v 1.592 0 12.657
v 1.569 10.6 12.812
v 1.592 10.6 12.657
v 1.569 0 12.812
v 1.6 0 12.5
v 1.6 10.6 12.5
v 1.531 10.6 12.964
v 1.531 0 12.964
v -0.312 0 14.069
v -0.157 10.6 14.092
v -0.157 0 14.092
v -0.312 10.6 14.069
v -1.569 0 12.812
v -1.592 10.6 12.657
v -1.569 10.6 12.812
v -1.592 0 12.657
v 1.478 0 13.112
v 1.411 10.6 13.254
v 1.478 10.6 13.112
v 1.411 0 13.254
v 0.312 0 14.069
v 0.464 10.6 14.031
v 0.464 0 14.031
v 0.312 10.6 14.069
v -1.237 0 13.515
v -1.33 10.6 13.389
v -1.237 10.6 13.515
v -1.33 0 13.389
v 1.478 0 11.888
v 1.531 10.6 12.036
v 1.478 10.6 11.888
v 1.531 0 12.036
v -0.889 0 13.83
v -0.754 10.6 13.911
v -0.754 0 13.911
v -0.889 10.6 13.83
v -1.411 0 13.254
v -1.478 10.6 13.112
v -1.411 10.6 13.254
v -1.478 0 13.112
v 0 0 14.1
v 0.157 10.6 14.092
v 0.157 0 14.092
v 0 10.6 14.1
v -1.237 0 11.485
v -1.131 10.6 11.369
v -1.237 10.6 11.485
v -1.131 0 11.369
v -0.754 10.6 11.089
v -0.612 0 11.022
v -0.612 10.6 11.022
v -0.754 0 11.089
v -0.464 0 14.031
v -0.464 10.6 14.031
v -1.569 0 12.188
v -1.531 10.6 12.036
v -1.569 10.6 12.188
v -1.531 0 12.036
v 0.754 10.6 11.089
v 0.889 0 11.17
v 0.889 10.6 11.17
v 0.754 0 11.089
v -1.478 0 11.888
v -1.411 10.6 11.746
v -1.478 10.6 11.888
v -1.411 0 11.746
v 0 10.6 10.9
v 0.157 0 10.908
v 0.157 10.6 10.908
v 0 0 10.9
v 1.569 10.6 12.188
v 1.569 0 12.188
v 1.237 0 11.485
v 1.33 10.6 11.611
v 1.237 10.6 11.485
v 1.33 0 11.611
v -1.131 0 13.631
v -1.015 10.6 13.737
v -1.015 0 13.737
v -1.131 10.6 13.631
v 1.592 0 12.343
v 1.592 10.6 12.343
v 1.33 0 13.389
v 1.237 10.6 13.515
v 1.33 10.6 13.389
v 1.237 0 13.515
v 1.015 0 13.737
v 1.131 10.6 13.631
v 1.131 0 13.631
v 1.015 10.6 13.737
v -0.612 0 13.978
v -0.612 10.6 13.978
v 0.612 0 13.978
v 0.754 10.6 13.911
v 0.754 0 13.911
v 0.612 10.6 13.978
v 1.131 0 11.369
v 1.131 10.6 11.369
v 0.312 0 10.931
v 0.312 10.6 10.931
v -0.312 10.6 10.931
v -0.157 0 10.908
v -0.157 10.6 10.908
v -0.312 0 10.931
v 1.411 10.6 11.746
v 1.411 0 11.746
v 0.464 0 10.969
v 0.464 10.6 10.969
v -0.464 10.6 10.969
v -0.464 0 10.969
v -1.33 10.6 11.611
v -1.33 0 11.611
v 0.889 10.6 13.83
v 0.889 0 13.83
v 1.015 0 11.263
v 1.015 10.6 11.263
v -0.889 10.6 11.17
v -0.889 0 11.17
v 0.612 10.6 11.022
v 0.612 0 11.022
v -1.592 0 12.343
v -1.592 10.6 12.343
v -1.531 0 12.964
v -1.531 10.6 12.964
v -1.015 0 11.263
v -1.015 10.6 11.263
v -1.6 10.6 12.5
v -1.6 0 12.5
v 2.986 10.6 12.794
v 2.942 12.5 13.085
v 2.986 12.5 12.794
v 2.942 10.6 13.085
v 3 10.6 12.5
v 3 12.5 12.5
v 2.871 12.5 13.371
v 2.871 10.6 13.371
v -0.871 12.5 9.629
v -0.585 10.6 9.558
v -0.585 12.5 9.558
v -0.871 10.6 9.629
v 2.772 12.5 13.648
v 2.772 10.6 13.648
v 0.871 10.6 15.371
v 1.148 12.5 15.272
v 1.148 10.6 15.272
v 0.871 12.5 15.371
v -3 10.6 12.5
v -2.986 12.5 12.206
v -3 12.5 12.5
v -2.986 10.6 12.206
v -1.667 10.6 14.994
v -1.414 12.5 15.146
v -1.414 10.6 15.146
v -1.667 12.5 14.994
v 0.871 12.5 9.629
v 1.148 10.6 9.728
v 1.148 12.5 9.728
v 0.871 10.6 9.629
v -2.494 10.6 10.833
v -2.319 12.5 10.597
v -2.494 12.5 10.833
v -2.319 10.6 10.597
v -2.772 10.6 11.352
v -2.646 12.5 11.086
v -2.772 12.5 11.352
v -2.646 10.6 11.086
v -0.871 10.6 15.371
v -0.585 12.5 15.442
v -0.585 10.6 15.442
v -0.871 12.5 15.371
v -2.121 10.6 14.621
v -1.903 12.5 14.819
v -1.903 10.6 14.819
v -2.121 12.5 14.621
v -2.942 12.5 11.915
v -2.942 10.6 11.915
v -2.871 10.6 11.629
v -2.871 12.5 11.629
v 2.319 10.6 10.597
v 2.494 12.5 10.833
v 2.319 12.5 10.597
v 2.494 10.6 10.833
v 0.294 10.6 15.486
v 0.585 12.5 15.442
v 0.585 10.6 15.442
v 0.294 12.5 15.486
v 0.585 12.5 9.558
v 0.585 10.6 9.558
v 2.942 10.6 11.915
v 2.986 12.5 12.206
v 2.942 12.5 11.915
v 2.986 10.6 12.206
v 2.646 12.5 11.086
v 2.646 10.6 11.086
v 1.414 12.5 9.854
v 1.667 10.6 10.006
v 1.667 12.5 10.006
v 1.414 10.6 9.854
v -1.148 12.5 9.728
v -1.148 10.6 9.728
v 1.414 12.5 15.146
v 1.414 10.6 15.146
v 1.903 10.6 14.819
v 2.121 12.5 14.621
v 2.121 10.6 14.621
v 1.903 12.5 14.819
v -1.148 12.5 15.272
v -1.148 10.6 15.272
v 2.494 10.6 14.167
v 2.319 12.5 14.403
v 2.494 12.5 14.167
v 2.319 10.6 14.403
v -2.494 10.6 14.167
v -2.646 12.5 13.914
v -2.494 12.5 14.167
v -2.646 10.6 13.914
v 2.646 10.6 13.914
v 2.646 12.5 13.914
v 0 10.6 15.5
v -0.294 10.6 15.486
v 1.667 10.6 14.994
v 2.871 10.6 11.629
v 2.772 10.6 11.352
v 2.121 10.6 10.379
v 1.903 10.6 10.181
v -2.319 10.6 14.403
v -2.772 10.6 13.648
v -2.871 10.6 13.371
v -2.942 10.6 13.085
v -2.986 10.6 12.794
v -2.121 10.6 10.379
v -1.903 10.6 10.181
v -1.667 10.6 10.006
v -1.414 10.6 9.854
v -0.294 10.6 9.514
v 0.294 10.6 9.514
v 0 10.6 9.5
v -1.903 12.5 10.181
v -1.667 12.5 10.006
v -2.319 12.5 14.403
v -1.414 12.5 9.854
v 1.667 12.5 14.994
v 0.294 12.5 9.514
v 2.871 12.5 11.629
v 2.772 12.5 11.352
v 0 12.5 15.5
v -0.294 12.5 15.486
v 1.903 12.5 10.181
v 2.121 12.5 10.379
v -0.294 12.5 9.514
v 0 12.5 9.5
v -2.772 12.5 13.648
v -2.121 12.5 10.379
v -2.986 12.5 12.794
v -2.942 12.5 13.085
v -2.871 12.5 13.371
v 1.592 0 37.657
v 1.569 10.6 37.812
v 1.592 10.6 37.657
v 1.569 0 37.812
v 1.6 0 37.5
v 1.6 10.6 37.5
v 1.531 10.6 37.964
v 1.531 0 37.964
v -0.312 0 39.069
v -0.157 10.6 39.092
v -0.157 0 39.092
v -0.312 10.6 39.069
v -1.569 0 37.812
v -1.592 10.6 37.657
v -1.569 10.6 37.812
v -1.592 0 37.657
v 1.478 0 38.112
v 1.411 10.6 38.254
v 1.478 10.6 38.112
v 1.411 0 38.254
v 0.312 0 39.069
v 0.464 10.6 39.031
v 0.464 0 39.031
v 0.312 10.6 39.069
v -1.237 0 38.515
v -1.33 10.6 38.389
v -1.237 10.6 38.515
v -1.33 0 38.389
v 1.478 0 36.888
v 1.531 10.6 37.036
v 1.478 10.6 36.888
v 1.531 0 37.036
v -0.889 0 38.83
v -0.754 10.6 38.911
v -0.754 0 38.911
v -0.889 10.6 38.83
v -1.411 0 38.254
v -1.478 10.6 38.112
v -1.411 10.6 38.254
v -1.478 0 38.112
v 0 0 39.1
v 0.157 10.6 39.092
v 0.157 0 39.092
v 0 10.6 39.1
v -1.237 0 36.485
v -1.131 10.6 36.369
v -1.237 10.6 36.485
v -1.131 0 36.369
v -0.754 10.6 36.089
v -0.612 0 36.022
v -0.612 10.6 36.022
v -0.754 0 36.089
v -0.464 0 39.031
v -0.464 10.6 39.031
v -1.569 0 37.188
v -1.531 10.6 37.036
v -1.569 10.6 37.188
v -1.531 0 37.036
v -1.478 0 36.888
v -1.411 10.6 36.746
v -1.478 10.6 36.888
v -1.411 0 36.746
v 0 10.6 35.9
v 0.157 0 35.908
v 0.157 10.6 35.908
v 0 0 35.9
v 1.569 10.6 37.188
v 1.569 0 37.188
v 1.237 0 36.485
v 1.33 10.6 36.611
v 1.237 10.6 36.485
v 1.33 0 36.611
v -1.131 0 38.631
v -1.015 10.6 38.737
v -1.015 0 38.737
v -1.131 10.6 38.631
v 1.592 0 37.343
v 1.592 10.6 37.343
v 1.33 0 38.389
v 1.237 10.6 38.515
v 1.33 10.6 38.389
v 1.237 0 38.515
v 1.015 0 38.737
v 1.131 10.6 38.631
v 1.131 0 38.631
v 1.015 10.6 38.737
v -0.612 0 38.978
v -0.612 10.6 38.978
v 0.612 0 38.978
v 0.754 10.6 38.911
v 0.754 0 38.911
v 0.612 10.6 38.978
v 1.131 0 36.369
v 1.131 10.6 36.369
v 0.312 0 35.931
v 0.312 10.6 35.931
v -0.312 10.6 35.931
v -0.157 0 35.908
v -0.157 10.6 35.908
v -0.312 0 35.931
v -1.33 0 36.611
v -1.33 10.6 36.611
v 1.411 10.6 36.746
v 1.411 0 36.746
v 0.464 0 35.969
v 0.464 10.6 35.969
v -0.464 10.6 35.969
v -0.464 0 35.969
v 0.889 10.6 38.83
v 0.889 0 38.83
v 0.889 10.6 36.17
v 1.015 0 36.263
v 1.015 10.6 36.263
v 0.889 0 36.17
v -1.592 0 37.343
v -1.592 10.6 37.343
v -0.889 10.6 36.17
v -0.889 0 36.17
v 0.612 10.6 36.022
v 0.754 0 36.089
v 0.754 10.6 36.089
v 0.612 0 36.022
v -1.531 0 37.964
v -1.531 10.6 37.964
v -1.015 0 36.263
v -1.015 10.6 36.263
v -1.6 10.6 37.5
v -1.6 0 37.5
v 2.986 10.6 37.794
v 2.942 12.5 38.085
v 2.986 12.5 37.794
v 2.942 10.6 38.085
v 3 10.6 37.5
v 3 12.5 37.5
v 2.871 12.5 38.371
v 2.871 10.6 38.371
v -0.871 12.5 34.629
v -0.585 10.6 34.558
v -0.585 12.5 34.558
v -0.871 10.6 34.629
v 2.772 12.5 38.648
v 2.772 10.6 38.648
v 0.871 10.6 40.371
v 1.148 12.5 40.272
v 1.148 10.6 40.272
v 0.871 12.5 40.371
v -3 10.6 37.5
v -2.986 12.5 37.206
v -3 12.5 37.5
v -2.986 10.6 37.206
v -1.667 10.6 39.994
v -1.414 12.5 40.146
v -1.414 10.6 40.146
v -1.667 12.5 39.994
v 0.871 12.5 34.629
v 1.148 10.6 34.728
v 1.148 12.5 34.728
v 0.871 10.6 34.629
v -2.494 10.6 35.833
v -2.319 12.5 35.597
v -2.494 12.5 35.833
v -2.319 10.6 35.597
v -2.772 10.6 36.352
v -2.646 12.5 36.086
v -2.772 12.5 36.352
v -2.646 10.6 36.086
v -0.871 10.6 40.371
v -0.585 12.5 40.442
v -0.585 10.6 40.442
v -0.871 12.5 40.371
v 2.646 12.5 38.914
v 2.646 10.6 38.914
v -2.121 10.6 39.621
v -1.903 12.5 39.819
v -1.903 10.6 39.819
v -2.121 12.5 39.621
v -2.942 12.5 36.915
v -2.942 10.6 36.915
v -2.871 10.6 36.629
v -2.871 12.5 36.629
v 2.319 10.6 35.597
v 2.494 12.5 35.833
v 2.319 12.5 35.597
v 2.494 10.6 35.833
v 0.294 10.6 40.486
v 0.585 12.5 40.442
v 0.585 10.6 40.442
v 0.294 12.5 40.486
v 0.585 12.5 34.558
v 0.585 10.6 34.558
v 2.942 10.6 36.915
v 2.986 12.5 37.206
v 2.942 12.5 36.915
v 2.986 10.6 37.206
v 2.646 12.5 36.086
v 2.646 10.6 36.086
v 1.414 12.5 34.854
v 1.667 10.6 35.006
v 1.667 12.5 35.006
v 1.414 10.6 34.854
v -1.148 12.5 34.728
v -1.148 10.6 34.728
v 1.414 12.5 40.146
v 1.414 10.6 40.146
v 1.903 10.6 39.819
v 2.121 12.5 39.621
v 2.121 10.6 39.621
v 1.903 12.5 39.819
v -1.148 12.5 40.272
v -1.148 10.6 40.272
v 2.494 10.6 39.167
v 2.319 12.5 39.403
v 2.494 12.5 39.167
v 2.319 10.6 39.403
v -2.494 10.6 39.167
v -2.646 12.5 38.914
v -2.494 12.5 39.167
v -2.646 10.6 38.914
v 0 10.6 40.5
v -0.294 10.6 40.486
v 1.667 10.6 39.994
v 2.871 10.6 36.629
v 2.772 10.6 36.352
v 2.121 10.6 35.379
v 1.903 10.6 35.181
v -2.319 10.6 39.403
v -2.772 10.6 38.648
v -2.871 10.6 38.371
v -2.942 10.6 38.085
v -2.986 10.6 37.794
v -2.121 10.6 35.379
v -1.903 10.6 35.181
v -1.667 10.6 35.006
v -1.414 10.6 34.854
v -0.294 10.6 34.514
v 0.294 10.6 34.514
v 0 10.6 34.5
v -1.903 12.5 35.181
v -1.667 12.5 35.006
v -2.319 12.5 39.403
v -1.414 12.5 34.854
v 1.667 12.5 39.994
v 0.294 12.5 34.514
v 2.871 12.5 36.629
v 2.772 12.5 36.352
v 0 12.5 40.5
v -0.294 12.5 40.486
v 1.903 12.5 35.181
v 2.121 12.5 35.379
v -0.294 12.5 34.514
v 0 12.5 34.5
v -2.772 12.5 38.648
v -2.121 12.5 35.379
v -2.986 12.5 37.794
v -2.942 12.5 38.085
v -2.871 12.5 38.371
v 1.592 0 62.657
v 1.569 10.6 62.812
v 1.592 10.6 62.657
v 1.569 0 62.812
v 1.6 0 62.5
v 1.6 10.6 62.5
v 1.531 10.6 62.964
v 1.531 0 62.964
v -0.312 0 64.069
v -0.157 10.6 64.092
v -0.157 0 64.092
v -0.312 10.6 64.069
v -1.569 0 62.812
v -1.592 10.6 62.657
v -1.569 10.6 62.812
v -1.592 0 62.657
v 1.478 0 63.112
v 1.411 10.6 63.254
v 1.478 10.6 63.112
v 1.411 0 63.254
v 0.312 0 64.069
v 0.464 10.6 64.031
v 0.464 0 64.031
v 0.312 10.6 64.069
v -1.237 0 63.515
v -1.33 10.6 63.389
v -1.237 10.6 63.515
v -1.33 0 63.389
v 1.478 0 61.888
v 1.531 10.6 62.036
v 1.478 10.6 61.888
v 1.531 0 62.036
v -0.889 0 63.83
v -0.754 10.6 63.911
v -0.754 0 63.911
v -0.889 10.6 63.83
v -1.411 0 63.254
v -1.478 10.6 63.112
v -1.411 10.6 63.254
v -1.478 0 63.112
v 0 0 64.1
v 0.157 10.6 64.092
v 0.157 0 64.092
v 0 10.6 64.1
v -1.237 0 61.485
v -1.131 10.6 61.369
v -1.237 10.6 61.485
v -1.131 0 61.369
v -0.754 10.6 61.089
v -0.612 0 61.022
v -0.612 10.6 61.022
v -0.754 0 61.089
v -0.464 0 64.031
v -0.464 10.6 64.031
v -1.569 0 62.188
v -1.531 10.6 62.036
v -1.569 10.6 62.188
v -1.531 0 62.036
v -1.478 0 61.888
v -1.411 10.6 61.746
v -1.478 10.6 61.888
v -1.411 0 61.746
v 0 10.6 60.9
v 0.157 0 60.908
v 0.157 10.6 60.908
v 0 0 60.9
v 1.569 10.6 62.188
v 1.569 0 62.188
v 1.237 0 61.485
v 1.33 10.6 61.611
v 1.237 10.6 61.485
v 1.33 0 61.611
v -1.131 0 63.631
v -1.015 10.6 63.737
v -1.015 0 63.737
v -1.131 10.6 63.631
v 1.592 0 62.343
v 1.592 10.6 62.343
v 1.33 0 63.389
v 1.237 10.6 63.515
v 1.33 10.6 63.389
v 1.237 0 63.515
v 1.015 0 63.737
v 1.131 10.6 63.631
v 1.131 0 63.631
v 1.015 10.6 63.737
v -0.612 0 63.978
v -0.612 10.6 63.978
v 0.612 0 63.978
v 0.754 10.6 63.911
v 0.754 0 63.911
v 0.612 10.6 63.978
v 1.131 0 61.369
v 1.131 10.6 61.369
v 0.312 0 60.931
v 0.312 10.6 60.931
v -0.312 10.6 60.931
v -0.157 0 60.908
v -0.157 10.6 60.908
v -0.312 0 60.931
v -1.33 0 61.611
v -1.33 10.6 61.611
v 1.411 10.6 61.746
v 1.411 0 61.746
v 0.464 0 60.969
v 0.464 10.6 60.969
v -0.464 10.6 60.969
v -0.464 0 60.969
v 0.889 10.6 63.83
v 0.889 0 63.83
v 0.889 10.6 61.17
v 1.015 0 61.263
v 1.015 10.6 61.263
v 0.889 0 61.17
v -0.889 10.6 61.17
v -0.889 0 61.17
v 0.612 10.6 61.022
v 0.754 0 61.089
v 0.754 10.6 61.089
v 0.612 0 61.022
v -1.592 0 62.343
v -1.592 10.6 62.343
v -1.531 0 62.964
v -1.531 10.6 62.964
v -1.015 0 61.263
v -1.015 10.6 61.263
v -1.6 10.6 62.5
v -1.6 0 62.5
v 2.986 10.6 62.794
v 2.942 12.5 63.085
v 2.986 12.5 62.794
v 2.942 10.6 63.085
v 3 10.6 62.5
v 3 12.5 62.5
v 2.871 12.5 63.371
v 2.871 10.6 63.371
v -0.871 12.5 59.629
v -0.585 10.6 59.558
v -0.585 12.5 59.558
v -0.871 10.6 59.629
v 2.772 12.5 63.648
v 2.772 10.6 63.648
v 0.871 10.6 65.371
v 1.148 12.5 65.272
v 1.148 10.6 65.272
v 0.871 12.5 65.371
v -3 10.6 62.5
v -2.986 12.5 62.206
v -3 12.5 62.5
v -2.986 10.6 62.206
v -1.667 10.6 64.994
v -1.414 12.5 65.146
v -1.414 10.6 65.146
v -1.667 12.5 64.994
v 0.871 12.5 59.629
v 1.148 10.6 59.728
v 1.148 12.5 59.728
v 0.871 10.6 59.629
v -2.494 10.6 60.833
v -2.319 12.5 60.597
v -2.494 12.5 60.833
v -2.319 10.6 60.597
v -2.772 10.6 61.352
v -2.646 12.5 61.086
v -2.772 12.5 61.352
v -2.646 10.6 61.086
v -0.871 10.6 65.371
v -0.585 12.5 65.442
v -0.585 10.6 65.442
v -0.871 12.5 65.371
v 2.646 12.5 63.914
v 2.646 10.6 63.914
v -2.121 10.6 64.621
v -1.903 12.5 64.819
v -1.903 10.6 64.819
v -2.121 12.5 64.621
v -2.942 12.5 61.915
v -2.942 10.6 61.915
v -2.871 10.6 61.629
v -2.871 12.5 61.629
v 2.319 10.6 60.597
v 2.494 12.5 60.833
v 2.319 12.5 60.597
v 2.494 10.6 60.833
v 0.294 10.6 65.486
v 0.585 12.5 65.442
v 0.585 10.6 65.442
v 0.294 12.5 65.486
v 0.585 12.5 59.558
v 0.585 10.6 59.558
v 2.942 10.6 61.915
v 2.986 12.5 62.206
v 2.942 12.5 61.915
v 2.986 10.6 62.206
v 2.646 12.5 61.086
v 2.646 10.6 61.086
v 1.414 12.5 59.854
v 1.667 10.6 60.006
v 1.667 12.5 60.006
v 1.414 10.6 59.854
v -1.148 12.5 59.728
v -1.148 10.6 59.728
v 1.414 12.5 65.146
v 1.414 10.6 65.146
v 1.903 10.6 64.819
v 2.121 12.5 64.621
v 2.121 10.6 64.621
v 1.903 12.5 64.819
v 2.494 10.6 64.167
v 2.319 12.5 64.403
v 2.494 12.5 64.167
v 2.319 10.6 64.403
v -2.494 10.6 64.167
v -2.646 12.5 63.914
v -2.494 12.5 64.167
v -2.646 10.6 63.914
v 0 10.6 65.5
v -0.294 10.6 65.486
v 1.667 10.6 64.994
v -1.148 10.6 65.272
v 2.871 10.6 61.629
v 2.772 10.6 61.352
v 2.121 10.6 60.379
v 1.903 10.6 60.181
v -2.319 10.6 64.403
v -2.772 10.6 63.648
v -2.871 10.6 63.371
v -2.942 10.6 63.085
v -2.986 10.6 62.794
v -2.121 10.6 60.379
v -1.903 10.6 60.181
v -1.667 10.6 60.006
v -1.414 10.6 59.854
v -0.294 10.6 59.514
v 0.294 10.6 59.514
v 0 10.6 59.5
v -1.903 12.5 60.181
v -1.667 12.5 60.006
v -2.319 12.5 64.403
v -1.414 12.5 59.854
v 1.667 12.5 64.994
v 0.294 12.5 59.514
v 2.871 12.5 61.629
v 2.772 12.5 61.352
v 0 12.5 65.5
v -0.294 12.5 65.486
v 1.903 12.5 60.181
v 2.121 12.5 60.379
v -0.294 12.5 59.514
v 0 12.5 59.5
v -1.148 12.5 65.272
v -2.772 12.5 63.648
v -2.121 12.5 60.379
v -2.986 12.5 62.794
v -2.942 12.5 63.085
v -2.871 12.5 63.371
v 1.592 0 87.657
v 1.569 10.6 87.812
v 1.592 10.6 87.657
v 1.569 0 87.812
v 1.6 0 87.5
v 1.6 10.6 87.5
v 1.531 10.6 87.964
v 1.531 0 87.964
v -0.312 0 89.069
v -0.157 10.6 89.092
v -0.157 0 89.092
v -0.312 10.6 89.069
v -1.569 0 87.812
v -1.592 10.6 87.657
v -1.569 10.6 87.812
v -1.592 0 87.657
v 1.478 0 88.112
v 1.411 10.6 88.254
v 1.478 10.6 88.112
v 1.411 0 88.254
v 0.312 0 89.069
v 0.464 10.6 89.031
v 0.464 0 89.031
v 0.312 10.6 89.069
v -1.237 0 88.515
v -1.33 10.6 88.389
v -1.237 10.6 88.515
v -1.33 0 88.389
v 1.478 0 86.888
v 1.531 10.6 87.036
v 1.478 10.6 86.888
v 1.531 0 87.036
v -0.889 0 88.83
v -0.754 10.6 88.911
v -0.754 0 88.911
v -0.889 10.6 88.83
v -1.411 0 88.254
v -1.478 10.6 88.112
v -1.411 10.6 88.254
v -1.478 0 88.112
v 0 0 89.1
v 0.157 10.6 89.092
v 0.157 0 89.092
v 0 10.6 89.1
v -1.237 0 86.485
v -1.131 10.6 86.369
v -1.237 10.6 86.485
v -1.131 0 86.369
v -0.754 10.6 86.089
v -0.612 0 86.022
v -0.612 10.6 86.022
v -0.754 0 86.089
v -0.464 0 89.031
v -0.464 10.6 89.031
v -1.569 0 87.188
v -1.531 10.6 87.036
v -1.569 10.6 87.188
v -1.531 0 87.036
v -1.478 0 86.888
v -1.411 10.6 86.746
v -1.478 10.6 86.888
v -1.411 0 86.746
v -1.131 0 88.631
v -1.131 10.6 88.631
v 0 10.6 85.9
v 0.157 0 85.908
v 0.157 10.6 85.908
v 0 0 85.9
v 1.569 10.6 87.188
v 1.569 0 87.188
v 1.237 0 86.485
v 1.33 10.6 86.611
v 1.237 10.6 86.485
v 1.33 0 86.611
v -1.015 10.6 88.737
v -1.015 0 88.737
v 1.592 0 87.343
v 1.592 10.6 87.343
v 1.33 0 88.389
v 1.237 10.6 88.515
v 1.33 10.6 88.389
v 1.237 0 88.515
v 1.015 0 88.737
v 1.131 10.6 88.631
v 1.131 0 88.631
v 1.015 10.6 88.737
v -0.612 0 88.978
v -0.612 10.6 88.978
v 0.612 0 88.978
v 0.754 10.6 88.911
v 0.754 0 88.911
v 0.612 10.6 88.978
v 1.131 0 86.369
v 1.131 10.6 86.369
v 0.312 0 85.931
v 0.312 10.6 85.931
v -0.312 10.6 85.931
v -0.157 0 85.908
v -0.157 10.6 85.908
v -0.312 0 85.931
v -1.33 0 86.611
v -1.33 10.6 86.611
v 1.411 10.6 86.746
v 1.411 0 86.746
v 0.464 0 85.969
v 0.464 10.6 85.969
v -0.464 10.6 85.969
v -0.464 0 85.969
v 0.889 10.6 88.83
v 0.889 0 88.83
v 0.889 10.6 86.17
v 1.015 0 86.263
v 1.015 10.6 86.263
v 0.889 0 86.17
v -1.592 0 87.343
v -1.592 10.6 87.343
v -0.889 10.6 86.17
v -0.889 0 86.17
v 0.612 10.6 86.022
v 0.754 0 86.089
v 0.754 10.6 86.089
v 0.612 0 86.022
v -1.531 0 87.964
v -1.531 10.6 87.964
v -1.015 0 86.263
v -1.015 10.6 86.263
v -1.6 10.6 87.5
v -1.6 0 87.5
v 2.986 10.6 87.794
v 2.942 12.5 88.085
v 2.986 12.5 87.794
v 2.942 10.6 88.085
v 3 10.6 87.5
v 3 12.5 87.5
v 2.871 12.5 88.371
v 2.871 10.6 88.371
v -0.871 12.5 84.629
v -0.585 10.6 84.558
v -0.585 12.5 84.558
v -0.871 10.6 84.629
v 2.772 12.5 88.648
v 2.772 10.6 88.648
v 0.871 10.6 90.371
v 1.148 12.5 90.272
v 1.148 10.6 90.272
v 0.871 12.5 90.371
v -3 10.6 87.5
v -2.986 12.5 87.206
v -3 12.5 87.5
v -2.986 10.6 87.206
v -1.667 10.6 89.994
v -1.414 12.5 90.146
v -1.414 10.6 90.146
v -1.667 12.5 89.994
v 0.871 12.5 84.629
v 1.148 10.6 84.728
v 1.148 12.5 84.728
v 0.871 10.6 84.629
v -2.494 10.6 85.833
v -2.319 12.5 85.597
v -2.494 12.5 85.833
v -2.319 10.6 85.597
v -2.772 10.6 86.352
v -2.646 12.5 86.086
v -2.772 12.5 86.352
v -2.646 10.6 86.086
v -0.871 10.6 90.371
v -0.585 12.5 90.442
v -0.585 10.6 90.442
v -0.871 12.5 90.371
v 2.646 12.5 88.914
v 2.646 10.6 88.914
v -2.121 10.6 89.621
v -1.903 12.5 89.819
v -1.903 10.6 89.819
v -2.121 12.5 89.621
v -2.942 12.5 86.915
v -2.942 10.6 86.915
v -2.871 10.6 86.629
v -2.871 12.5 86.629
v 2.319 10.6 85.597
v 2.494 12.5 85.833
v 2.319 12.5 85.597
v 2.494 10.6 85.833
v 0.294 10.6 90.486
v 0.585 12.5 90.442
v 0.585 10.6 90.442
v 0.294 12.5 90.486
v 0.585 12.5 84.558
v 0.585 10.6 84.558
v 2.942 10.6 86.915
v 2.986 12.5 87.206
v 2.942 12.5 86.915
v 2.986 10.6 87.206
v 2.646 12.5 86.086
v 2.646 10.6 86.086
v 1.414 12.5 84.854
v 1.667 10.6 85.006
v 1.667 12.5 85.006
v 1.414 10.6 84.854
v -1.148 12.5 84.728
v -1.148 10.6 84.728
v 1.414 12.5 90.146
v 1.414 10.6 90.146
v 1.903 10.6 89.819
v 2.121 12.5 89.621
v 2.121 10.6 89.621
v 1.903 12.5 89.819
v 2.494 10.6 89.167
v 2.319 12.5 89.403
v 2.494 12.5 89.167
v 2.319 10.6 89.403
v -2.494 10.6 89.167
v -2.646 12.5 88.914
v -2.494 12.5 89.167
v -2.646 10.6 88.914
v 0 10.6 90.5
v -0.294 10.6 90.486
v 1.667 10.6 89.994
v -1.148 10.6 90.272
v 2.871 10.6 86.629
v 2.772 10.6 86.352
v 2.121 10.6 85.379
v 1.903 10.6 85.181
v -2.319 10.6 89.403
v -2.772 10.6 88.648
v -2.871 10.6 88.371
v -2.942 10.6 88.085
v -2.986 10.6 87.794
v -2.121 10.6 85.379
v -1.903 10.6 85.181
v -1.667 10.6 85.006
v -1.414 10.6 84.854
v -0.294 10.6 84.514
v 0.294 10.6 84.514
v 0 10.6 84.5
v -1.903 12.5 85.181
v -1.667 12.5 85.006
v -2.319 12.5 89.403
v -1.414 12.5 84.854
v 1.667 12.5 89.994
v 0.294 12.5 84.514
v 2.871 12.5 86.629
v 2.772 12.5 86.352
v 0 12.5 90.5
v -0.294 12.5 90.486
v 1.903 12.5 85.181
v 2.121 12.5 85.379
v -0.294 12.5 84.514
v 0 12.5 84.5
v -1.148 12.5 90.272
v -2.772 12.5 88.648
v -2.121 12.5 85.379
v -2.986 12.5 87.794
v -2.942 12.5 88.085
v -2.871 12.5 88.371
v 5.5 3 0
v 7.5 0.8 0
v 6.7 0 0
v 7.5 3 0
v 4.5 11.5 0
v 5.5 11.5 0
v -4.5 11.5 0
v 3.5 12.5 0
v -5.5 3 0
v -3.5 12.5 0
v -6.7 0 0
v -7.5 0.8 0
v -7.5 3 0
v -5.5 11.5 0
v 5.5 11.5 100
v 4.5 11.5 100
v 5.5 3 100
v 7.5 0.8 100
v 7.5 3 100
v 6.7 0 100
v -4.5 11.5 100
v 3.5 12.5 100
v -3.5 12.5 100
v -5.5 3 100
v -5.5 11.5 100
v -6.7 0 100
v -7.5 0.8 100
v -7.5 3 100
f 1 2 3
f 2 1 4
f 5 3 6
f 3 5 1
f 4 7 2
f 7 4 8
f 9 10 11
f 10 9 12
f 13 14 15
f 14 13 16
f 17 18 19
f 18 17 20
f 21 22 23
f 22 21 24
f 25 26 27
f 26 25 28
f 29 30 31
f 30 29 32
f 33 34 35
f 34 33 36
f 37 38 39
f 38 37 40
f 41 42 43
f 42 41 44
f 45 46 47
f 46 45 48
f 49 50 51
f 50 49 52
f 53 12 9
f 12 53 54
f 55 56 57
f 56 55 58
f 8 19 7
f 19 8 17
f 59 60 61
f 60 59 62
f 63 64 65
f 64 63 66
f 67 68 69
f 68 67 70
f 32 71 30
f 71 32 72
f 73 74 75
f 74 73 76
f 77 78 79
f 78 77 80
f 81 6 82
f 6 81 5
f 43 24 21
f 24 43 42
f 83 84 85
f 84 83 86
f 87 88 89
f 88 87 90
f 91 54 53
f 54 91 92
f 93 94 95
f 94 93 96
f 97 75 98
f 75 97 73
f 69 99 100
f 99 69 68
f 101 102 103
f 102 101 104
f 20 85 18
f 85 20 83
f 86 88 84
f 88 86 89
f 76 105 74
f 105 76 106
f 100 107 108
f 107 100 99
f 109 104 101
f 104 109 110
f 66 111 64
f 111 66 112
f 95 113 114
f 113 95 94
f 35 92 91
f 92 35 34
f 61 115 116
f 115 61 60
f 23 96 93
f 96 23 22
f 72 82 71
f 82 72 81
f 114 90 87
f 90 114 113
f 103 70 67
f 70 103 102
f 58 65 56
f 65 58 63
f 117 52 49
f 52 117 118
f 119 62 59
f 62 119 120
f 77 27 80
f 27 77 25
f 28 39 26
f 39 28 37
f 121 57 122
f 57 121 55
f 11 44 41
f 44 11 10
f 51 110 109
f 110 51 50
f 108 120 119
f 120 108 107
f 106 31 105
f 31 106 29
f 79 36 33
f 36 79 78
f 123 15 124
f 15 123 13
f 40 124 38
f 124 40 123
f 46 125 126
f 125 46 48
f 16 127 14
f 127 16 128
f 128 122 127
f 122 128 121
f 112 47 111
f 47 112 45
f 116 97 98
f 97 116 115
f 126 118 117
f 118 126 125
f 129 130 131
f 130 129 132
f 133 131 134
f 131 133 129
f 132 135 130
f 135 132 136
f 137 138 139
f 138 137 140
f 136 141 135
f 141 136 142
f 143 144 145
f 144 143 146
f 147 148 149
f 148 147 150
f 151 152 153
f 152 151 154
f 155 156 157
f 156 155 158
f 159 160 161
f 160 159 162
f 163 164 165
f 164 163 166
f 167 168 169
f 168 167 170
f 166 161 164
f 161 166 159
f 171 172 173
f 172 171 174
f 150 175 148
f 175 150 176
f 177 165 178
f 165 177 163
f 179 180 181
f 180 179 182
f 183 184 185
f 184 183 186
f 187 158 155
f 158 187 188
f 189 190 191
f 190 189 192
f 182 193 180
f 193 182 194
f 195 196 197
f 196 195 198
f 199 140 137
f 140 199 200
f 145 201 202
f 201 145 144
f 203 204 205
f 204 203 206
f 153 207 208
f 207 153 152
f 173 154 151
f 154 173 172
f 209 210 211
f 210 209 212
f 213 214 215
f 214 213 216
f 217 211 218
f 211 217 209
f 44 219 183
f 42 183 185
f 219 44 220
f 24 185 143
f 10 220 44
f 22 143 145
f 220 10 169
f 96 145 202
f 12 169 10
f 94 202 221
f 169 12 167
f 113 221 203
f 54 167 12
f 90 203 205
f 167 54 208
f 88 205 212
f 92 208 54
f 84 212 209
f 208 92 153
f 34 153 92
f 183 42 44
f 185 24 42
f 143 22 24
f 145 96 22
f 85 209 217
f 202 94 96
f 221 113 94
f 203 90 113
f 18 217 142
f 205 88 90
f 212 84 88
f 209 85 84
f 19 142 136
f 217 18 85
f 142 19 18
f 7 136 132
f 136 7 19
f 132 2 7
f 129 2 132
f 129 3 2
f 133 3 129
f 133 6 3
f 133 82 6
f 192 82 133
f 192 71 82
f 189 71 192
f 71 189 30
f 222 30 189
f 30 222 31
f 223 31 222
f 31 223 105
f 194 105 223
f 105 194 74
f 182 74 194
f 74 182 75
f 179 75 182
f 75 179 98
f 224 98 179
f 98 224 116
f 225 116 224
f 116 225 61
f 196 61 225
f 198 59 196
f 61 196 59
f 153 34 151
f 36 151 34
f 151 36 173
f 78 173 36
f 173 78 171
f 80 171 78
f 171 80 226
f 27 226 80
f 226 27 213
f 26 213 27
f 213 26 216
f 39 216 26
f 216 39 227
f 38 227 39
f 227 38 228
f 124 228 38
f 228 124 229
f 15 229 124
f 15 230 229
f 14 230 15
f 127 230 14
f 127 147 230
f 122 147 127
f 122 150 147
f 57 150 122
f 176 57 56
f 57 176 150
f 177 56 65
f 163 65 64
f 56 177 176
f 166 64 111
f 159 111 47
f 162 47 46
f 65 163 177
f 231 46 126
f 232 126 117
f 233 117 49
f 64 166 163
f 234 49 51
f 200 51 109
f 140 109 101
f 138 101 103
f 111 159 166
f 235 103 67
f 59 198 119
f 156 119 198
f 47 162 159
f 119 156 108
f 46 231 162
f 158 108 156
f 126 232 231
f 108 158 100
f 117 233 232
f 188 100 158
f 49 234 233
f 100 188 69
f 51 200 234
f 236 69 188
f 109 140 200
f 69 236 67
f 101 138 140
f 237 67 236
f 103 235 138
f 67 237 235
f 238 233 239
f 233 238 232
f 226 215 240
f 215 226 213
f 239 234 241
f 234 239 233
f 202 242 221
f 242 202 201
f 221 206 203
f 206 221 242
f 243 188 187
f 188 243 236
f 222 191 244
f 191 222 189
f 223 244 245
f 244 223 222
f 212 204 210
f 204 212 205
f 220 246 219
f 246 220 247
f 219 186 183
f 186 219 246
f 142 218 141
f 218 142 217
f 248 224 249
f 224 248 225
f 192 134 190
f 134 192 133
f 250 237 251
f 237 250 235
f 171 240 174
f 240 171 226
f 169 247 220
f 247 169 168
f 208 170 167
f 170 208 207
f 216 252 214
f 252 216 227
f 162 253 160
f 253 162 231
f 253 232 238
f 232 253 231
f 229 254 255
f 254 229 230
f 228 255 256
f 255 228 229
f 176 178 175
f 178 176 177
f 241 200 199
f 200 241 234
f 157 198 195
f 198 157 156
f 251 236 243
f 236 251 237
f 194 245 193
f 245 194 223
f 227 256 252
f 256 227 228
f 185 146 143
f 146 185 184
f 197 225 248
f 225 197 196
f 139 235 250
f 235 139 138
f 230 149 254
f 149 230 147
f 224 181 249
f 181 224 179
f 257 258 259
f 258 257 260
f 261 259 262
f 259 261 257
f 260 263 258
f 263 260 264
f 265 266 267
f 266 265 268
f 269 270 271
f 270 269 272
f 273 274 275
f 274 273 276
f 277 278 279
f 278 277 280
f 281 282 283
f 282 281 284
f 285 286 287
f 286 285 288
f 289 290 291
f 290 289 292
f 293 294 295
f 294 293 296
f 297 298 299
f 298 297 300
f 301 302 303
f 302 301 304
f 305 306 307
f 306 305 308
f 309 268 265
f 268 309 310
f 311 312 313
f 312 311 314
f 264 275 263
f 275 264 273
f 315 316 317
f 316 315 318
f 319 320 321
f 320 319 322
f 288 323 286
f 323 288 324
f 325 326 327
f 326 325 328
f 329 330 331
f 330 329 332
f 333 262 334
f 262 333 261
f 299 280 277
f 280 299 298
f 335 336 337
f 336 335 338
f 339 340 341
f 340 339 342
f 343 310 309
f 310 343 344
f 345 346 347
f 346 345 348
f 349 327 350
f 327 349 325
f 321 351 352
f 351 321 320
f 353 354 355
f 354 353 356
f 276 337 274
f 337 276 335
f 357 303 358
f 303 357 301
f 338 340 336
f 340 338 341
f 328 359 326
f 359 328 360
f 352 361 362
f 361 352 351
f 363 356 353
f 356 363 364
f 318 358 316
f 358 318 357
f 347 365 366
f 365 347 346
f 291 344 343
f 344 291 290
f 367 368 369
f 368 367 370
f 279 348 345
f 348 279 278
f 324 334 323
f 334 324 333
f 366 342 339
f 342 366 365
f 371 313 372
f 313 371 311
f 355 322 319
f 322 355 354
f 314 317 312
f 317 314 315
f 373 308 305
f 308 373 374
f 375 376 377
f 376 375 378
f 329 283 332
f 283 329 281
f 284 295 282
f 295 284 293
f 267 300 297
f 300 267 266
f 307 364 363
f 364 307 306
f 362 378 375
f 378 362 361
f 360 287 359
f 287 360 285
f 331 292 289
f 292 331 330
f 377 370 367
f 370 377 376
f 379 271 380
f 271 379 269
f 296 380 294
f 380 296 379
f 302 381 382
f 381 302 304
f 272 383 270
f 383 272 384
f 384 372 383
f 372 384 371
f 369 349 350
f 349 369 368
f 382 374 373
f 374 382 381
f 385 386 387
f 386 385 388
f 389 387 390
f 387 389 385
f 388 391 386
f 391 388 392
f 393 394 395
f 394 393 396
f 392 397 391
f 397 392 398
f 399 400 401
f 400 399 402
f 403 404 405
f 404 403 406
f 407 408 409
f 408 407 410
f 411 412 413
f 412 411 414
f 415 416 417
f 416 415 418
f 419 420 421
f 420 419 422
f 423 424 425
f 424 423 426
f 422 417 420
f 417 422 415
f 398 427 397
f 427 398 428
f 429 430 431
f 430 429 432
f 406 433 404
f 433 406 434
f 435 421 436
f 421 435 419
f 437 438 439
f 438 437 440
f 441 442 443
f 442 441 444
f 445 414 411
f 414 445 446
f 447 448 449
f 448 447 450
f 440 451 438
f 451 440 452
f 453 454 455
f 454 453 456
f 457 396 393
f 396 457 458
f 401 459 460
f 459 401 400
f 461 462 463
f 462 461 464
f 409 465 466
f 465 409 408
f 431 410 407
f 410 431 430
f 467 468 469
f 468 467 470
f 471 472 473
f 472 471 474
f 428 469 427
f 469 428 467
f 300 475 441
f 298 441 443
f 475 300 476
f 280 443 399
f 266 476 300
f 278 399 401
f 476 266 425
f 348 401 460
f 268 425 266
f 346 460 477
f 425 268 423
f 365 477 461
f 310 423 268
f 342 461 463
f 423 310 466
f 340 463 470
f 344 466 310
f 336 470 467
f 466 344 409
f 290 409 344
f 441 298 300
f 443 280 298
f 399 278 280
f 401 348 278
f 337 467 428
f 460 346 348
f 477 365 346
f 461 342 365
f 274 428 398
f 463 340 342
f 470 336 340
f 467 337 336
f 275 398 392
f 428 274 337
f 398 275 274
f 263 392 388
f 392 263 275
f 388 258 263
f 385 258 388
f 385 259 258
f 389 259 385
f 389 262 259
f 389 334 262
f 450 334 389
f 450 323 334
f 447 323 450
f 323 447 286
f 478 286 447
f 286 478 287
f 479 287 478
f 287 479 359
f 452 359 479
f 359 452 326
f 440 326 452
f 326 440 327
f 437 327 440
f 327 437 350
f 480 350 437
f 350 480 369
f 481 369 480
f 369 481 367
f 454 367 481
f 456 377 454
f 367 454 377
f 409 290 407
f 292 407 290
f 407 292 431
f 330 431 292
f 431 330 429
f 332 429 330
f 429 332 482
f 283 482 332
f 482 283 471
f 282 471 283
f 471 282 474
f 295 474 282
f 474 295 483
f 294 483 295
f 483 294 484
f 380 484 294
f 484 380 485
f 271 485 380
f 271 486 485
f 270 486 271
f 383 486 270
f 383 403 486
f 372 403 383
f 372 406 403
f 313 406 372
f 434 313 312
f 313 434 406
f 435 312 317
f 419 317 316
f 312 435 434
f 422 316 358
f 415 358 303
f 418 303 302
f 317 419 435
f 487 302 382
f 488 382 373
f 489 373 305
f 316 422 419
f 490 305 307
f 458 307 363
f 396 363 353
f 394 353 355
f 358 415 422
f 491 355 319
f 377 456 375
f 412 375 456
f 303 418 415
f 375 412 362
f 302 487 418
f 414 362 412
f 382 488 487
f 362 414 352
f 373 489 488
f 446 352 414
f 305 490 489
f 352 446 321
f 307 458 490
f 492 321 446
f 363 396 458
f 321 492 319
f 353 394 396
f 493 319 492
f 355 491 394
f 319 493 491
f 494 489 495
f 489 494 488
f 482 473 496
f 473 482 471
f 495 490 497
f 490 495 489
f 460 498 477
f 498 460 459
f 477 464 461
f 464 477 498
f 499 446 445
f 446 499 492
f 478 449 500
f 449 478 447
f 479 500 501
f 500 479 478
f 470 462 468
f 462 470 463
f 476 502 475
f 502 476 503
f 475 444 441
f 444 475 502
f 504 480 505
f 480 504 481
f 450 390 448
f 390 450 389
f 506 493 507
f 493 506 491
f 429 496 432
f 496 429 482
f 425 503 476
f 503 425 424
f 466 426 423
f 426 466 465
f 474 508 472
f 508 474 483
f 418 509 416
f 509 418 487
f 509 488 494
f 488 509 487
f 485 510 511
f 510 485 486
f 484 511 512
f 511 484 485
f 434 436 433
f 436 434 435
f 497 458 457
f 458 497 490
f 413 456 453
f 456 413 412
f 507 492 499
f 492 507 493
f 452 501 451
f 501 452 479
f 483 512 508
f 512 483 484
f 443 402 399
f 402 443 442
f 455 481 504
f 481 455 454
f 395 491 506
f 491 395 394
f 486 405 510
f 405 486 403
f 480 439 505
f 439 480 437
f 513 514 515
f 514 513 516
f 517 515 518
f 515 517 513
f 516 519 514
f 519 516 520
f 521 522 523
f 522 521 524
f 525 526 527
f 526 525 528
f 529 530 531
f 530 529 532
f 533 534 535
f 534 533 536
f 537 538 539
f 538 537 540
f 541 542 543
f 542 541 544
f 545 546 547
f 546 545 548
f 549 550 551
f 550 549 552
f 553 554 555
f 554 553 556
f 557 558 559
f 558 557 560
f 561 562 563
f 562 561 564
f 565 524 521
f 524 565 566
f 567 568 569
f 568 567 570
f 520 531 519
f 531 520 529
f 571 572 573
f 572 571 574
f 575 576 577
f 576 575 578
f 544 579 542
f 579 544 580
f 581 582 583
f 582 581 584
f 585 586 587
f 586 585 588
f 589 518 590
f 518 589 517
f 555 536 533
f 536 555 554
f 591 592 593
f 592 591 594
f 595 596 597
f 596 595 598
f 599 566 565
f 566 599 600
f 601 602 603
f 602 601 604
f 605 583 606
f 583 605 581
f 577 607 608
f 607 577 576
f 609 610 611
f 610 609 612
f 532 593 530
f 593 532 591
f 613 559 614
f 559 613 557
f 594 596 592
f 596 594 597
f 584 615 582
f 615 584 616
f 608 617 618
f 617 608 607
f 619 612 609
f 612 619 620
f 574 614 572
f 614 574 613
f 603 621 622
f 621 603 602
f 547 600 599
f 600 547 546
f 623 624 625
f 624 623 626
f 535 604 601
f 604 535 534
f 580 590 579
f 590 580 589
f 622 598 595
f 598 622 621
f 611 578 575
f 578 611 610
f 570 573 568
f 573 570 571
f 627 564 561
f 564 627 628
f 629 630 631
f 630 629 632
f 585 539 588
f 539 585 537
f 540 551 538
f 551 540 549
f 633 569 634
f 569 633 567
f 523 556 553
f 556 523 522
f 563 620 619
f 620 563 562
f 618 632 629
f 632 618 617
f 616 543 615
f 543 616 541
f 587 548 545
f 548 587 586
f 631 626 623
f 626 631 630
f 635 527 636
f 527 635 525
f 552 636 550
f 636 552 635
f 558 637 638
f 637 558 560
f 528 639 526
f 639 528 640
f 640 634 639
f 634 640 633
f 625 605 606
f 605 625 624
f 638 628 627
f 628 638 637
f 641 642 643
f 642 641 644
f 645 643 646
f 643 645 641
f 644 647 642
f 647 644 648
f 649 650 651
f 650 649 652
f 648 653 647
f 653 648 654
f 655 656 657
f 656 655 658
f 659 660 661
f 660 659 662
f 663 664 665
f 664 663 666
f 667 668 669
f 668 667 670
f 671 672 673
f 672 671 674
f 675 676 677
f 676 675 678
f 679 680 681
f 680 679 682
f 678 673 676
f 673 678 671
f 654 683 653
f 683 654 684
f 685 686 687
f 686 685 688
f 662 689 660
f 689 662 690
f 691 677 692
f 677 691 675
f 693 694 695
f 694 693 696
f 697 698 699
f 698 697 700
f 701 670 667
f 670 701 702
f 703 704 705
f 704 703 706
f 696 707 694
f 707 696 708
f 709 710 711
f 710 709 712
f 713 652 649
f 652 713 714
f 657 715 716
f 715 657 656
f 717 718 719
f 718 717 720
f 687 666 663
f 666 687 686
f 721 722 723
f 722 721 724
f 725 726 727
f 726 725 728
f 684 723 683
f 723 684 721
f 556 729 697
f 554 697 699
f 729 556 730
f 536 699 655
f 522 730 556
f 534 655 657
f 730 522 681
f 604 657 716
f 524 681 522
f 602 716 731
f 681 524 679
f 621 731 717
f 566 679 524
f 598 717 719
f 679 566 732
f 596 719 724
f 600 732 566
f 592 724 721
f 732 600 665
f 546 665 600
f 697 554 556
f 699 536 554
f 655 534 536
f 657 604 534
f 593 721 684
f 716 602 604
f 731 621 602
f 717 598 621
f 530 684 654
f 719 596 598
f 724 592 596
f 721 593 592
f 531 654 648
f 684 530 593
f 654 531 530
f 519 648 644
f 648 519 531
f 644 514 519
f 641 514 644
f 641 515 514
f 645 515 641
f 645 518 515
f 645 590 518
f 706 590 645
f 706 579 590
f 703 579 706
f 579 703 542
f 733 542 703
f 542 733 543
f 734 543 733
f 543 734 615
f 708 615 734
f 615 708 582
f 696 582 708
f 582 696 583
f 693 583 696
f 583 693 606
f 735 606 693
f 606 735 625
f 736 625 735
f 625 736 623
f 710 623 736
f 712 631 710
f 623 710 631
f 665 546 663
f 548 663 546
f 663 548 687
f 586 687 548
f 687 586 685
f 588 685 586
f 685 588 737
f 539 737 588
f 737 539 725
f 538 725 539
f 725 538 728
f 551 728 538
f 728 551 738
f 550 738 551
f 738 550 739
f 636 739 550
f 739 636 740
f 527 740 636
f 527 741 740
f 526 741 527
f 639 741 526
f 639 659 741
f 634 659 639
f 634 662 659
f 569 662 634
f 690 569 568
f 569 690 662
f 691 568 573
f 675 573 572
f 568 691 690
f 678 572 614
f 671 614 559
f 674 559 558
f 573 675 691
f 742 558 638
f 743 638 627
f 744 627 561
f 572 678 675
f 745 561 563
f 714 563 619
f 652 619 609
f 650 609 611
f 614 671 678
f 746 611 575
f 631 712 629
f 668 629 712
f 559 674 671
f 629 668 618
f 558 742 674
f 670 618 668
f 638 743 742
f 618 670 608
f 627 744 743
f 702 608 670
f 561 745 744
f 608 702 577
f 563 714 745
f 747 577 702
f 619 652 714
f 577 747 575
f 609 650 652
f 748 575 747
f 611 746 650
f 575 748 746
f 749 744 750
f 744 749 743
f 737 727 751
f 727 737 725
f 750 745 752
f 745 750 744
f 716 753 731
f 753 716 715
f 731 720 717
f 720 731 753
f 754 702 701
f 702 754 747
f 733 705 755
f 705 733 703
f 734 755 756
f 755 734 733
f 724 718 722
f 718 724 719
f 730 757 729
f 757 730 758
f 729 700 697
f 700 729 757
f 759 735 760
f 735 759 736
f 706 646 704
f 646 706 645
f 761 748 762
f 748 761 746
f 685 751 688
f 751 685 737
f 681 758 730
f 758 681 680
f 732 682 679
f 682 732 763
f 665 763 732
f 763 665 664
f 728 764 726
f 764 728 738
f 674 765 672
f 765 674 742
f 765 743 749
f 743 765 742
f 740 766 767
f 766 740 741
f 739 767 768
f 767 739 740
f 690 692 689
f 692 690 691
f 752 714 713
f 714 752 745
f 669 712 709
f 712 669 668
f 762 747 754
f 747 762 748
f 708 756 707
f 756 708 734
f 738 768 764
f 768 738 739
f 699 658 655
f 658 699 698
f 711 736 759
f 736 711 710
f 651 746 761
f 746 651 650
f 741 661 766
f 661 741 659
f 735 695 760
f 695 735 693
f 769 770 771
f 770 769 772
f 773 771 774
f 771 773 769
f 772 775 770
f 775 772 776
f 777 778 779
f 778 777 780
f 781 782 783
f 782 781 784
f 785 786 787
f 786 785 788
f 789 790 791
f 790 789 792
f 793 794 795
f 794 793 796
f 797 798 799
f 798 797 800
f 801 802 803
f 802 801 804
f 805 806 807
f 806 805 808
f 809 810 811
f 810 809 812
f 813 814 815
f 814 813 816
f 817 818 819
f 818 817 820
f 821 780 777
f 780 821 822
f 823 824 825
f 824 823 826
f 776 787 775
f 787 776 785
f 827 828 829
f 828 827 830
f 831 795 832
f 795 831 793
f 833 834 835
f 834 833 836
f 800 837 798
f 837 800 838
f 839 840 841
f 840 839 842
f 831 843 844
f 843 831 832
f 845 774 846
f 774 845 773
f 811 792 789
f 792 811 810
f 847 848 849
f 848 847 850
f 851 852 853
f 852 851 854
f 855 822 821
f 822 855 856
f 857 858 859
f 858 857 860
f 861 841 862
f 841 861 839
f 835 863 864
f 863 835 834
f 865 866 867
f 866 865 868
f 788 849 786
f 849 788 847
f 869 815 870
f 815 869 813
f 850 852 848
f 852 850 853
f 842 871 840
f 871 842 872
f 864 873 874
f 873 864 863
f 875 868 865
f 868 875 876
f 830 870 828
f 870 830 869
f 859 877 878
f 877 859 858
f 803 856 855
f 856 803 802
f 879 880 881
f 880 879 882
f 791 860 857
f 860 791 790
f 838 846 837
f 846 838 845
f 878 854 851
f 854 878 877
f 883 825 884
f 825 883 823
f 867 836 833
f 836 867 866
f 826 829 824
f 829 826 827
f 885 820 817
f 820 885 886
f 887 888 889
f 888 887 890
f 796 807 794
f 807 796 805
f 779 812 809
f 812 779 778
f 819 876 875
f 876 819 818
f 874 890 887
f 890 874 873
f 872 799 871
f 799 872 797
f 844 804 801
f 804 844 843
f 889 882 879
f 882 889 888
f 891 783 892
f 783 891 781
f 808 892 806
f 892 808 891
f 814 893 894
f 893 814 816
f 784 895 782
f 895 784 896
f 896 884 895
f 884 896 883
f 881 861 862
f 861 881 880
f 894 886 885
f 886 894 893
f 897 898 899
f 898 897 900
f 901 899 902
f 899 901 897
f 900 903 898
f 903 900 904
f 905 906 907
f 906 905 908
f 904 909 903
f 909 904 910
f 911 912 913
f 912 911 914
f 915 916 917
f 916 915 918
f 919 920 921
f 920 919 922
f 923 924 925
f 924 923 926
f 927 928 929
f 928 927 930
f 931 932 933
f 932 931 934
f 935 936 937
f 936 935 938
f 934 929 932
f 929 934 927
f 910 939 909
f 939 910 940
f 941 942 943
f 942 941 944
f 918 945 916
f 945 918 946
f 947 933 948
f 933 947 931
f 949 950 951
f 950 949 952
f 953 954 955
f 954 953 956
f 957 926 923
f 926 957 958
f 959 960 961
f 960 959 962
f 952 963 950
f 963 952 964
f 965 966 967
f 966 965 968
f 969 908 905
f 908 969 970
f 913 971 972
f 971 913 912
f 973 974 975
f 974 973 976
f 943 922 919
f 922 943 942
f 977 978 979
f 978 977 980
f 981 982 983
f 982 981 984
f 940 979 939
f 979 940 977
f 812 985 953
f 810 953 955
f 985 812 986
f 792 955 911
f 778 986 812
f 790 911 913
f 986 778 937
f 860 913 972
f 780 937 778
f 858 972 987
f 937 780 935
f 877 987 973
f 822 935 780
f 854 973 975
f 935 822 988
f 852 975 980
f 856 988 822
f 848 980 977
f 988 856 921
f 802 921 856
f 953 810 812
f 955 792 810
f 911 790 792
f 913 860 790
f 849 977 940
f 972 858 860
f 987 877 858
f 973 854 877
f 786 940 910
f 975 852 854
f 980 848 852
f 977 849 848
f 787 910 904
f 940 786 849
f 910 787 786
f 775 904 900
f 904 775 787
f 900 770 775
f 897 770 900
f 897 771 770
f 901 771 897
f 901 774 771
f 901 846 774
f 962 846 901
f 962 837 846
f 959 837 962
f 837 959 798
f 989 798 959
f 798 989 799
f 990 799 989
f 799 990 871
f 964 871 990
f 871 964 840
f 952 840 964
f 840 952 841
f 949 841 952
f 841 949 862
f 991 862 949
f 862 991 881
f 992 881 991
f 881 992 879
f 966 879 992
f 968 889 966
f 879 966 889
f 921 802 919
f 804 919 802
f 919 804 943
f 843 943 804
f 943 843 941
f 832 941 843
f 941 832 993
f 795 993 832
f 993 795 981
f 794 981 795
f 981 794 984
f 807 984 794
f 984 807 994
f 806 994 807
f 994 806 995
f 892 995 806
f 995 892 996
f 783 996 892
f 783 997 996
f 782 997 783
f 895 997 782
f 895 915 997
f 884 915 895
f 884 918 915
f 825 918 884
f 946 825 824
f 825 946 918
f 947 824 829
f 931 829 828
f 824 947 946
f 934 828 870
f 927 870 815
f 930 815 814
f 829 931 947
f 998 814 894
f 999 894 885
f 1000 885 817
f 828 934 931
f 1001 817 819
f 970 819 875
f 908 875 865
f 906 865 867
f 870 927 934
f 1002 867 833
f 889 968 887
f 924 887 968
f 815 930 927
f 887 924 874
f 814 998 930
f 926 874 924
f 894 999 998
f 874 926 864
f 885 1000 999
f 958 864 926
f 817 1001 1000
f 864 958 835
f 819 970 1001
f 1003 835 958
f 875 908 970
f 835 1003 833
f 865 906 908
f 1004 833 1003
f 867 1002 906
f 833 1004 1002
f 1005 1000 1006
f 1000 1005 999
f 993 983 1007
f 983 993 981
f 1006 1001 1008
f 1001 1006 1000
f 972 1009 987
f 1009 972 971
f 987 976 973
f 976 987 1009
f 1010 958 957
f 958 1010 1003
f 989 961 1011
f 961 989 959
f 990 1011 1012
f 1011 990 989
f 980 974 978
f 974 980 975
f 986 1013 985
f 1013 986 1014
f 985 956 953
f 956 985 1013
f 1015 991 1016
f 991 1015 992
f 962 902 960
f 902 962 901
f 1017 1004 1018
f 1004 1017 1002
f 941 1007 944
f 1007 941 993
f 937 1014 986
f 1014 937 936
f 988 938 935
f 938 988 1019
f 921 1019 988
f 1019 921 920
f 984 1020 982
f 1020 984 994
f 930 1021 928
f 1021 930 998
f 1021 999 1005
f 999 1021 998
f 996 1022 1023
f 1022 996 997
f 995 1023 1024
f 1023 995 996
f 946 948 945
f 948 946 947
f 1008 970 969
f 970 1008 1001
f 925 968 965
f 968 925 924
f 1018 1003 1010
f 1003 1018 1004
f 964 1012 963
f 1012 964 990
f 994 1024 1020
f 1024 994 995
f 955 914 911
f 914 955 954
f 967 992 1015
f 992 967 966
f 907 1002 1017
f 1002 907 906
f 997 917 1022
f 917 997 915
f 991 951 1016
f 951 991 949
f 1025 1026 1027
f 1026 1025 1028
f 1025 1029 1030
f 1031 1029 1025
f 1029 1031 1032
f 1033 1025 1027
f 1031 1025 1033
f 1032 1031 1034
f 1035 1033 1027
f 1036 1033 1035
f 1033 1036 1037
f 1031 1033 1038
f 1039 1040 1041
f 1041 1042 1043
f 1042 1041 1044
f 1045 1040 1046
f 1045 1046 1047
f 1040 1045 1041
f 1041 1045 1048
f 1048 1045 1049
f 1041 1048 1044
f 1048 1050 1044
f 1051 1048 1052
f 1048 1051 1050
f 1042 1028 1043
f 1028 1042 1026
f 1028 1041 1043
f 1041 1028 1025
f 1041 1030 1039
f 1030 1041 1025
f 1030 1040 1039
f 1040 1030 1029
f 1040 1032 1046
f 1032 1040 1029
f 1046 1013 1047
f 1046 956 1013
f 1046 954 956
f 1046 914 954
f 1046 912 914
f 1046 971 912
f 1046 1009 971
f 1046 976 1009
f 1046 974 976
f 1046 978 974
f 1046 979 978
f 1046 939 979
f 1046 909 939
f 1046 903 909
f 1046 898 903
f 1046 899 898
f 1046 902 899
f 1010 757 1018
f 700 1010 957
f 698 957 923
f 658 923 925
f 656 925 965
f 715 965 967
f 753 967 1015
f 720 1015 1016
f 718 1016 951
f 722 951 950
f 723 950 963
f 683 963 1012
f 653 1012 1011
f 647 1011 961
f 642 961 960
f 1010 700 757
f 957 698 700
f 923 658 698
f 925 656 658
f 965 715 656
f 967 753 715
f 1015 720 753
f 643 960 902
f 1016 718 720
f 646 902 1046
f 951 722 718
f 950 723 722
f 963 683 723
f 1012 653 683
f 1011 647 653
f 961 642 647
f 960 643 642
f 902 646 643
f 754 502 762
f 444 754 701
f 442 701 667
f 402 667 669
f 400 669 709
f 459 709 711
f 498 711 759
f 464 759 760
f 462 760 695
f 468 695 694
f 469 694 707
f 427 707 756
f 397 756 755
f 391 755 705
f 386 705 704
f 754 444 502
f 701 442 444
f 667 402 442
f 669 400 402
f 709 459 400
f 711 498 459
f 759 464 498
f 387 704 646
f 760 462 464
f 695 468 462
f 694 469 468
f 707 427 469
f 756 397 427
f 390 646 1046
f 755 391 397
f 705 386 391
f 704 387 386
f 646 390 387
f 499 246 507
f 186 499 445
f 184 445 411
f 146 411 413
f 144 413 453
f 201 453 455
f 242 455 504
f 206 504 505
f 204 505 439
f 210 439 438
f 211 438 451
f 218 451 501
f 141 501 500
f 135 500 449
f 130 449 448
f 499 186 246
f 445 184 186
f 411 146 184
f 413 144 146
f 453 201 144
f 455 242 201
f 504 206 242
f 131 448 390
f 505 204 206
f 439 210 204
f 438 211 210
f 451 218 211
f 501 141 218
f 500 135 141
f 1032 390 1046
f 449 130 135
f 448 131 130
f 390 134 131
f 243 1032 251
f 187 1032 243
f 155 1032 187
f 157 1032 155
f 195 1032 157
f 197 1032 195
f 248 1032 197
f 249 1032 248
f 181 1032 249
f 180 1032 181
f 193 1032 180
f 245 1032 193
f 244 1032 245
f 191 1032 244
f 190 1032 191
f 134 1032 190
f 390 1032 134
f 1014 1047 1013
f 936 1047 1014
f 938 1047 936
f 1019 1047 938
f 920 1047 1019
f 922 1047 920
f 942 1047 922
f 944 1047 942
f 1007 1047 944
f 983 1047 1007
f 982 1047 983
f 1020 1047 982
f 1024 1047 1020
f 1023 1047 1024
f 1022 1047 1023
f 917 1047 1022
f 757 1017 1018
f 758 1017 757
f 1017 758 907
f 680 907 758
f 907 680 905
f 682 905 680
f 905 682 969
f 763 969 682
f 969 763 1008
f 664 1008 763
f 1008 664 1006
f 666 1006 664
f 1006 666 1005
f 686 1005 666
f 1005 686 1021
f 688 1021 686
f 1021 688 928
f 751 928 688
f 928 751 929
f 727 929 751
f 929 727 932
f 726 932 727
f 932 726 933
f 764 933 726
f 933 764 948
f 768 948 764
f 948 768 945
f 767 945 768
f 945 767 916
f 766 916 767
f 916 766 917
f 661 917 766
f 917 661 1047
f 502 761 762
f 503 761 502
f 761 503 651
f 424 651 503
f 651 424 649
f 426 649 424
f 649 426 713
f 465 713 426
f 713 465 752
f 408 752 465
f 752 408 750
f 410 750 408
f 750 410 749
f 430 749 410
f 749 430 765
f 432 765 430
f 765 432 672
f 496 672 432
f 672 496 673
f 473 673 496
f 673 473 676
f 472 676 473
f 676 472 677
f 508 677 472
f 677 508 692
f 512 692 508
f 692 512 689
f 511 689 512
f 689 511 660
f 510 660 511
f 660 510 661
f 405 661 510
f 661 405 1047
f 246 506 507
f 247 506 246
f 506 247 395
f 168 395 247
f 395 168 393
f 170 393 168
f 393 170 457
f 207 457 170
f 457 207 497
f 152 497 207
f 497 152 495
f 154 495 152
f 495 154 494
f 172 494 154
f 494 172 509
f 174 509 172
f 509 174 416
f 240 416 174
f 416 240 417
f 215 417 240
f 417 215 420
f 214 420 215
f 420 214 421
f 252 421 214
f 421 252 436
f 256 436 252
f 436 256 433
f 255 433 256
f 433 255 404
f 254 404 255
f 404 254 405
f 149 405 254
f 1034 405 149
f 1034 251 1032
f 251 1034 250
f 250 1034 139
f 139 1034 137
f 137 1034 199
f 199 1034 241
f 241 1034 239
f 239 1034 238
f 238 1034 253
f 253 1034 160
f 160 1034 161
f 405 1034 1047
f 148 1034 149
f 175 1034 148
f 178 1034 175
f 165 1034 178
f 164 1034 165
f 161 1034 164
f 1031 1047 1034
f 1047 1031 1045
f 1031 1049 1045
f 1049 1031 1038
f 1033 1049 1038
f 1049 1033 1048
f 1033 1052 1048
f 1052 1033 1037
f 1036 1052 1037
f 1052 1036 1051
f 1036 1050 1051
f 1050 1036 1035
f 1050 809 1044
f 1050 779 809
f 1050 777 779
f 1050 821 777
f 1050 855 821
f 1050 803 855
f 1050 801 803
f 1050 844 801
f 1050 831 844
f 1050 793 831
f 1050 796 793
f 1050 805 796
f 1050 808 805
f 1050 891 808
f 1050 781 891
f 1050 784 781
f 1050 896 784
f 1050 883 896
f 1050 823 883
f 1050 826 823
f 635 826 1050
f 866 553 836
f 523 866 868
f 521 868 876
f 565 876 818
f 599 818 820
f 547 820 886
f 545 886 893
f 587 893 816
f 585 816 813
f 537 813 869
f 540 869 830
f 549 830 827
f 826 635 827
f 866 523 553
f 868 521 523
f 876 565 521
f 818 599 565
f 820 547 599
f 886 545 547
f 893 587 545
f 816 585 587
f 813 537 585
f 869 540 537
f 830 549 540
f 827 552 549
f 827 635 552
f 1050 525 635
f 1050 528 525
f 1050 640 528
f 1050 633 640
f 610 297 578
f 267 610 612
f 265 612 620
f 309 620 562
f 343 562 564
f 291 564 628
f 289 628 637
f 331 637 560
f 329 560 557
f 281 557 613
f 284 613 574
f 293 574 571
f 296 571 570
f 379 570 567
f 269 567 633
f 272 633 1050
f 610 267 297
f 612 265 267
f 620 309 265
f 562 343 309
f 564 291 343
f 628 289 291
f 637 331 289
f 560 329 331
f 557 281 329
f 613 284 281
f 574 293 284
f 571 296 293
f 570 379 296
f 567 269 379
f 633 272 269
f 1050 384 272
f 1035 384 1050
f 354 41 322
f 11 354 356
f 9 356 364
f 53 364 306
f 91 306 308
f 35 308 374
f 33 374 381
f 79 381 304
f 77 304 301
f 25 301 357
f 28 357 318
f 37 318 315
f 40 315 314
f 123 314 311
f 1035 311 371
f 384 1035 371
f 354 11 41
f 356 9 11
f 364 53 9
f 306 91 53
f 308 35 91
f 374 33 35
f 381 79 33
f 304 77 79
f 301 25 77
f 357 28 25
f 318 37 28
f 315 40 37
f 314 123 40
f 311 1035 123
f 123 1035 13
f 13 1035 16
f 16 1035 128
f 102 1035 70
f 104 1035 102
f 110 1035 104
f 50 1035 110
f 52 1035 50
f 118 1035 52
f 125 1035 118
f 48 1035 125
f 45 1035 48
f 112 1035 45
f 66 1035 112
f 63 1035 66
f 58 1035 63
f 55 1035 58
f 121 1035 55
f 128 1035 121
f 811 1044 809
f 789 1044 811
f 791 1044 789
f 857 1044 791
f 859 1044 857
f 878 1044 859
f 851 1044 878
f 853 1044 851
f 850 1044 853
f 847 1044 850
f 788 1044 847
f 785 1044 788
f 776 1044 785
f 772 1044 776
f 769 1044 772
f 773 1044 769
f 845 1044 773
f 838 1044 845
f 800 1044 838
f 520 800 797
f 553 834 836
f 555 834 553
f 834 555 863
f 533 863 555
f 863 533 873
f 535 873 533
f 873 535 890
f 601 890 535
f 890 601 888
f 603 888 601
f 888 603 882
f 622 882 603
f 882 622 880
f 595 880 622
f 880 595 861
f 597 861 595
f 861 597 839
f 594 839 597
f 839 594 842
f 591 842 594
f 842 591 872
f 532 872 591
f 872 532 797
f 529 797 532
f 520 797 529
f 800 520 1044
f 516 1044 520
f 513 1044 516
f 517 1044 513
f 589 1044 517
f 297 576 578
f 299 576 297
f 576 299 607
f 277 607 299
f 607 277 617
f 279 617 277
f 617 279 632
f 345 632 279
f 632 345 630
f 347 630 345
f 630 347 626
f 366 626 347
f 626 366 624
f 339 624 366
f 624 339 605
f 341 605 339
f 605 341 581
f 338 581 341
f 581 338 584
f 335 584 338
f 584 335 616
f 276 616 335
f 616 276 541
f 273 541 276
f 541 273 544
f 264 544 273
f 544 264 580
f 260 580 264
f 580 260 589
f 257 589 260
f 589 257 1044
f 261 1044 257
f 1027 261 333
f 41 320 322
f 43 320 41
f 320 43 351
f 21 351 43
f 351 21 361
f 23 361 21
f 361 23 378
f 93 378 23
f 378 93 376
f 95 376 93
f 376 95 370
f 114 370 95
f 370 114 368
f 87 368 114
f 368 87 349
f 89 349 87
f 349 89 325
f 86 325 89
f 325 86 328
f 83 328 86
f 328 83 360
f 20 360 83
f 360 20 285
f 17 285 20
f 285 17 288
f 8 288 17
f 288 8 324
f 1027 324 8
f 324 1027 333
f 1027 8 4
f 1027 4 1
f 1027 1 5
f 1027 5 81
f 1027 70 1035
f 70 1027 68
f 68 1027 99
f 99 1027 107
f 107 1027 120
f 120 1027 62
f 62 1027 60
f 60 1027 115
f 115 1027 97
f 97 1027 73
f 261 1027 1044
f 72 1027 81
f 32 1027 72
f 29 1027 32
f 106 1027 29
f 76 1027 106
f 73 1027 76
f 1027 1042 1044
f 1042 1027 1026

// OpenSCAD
$fn = 64;

// Miniature linear guide rail (approximate profile)
// Overall: 15.0mm wide, 12.5mm tall, 100mm long

w = 15.0;
h = 12.5;
L = 100.0;

// Profile features (tuned to look like a miniature rail)
top_flat_w = 7.0;
side_step_w = 2.0;
side_step_h = 3.0;
top_chamfer = 1.0;
bottom_chamfer = 0.8;

// Mounting holes
hole_d = 3.2;
csk_d  = 6.0;
csk_h  = 1.8;
hole_pitch = 25.0;
hole_edge_margin = 12.5; // from each end to first/last hole

module rail_profile_2d() {
    // Construct a symmetric rail-like cross-section using a polygon.
    // Coordinates in X (width) and Y (height), centered on X=0, base at Y=0.
    // Ensures overall width w and height h.
    polygon(points=[
        // left bottom to right bottom with small chamfers
        [-w/2 + bottom_chamfer, 0],
        [ w/2 - bottom_chamfer, 0],
        [ w/2, bottom_chamfer],

        // right side up to side step
        [ w/2, side_step_h],
        [ w/2 - side_step_w, side_step_h],

        // up to near top with chamfer into top flat
        [ w/2 - side_step_w, h - top_chamfer],
        [ top_flat_w/2 + top_chamfer, h - top_chamfer],
        [ top_flat_w/2, h],

        // across top flat
        [-top_flat_w/2, h],
        [-top_flat_w/2 - top_chamfer, h - top_chamfer],

        // down left side symmetric
        [-w/2 + side_step_w, h - top_chamfer],
        [-w/2 + side_step_w, side_step_h],
        [-w/2, side_step_h],
        [-w/2, bottom_chamfer]
    ]);
}

module rail_body() {
    linear_extrude(height=L, center=false, convexity=10)
        rail_profile_2d();
}

module mounting_holes() {
    // Through holes along centerline, with shallow counterbore/countersink-like recess on top
    for (z = [hole_edge_margin : hole_pitch : L - hole_edge_margin + 0.001]) {
        // through hole
        translate([0, h/2, z])
            rotate([90,0,0])
                cylinder(d=hole_d, h=h+2, center=true);

        // top recess (counterbore-ish)
        translate([0, h - csk_h/2, z])
            rotate([90,0,0])
                cylinder(d=csk_d, h=csk_h+0.2, center=true);
    }
}

difference() {
    rail_body();
    mounting_holes();
}
